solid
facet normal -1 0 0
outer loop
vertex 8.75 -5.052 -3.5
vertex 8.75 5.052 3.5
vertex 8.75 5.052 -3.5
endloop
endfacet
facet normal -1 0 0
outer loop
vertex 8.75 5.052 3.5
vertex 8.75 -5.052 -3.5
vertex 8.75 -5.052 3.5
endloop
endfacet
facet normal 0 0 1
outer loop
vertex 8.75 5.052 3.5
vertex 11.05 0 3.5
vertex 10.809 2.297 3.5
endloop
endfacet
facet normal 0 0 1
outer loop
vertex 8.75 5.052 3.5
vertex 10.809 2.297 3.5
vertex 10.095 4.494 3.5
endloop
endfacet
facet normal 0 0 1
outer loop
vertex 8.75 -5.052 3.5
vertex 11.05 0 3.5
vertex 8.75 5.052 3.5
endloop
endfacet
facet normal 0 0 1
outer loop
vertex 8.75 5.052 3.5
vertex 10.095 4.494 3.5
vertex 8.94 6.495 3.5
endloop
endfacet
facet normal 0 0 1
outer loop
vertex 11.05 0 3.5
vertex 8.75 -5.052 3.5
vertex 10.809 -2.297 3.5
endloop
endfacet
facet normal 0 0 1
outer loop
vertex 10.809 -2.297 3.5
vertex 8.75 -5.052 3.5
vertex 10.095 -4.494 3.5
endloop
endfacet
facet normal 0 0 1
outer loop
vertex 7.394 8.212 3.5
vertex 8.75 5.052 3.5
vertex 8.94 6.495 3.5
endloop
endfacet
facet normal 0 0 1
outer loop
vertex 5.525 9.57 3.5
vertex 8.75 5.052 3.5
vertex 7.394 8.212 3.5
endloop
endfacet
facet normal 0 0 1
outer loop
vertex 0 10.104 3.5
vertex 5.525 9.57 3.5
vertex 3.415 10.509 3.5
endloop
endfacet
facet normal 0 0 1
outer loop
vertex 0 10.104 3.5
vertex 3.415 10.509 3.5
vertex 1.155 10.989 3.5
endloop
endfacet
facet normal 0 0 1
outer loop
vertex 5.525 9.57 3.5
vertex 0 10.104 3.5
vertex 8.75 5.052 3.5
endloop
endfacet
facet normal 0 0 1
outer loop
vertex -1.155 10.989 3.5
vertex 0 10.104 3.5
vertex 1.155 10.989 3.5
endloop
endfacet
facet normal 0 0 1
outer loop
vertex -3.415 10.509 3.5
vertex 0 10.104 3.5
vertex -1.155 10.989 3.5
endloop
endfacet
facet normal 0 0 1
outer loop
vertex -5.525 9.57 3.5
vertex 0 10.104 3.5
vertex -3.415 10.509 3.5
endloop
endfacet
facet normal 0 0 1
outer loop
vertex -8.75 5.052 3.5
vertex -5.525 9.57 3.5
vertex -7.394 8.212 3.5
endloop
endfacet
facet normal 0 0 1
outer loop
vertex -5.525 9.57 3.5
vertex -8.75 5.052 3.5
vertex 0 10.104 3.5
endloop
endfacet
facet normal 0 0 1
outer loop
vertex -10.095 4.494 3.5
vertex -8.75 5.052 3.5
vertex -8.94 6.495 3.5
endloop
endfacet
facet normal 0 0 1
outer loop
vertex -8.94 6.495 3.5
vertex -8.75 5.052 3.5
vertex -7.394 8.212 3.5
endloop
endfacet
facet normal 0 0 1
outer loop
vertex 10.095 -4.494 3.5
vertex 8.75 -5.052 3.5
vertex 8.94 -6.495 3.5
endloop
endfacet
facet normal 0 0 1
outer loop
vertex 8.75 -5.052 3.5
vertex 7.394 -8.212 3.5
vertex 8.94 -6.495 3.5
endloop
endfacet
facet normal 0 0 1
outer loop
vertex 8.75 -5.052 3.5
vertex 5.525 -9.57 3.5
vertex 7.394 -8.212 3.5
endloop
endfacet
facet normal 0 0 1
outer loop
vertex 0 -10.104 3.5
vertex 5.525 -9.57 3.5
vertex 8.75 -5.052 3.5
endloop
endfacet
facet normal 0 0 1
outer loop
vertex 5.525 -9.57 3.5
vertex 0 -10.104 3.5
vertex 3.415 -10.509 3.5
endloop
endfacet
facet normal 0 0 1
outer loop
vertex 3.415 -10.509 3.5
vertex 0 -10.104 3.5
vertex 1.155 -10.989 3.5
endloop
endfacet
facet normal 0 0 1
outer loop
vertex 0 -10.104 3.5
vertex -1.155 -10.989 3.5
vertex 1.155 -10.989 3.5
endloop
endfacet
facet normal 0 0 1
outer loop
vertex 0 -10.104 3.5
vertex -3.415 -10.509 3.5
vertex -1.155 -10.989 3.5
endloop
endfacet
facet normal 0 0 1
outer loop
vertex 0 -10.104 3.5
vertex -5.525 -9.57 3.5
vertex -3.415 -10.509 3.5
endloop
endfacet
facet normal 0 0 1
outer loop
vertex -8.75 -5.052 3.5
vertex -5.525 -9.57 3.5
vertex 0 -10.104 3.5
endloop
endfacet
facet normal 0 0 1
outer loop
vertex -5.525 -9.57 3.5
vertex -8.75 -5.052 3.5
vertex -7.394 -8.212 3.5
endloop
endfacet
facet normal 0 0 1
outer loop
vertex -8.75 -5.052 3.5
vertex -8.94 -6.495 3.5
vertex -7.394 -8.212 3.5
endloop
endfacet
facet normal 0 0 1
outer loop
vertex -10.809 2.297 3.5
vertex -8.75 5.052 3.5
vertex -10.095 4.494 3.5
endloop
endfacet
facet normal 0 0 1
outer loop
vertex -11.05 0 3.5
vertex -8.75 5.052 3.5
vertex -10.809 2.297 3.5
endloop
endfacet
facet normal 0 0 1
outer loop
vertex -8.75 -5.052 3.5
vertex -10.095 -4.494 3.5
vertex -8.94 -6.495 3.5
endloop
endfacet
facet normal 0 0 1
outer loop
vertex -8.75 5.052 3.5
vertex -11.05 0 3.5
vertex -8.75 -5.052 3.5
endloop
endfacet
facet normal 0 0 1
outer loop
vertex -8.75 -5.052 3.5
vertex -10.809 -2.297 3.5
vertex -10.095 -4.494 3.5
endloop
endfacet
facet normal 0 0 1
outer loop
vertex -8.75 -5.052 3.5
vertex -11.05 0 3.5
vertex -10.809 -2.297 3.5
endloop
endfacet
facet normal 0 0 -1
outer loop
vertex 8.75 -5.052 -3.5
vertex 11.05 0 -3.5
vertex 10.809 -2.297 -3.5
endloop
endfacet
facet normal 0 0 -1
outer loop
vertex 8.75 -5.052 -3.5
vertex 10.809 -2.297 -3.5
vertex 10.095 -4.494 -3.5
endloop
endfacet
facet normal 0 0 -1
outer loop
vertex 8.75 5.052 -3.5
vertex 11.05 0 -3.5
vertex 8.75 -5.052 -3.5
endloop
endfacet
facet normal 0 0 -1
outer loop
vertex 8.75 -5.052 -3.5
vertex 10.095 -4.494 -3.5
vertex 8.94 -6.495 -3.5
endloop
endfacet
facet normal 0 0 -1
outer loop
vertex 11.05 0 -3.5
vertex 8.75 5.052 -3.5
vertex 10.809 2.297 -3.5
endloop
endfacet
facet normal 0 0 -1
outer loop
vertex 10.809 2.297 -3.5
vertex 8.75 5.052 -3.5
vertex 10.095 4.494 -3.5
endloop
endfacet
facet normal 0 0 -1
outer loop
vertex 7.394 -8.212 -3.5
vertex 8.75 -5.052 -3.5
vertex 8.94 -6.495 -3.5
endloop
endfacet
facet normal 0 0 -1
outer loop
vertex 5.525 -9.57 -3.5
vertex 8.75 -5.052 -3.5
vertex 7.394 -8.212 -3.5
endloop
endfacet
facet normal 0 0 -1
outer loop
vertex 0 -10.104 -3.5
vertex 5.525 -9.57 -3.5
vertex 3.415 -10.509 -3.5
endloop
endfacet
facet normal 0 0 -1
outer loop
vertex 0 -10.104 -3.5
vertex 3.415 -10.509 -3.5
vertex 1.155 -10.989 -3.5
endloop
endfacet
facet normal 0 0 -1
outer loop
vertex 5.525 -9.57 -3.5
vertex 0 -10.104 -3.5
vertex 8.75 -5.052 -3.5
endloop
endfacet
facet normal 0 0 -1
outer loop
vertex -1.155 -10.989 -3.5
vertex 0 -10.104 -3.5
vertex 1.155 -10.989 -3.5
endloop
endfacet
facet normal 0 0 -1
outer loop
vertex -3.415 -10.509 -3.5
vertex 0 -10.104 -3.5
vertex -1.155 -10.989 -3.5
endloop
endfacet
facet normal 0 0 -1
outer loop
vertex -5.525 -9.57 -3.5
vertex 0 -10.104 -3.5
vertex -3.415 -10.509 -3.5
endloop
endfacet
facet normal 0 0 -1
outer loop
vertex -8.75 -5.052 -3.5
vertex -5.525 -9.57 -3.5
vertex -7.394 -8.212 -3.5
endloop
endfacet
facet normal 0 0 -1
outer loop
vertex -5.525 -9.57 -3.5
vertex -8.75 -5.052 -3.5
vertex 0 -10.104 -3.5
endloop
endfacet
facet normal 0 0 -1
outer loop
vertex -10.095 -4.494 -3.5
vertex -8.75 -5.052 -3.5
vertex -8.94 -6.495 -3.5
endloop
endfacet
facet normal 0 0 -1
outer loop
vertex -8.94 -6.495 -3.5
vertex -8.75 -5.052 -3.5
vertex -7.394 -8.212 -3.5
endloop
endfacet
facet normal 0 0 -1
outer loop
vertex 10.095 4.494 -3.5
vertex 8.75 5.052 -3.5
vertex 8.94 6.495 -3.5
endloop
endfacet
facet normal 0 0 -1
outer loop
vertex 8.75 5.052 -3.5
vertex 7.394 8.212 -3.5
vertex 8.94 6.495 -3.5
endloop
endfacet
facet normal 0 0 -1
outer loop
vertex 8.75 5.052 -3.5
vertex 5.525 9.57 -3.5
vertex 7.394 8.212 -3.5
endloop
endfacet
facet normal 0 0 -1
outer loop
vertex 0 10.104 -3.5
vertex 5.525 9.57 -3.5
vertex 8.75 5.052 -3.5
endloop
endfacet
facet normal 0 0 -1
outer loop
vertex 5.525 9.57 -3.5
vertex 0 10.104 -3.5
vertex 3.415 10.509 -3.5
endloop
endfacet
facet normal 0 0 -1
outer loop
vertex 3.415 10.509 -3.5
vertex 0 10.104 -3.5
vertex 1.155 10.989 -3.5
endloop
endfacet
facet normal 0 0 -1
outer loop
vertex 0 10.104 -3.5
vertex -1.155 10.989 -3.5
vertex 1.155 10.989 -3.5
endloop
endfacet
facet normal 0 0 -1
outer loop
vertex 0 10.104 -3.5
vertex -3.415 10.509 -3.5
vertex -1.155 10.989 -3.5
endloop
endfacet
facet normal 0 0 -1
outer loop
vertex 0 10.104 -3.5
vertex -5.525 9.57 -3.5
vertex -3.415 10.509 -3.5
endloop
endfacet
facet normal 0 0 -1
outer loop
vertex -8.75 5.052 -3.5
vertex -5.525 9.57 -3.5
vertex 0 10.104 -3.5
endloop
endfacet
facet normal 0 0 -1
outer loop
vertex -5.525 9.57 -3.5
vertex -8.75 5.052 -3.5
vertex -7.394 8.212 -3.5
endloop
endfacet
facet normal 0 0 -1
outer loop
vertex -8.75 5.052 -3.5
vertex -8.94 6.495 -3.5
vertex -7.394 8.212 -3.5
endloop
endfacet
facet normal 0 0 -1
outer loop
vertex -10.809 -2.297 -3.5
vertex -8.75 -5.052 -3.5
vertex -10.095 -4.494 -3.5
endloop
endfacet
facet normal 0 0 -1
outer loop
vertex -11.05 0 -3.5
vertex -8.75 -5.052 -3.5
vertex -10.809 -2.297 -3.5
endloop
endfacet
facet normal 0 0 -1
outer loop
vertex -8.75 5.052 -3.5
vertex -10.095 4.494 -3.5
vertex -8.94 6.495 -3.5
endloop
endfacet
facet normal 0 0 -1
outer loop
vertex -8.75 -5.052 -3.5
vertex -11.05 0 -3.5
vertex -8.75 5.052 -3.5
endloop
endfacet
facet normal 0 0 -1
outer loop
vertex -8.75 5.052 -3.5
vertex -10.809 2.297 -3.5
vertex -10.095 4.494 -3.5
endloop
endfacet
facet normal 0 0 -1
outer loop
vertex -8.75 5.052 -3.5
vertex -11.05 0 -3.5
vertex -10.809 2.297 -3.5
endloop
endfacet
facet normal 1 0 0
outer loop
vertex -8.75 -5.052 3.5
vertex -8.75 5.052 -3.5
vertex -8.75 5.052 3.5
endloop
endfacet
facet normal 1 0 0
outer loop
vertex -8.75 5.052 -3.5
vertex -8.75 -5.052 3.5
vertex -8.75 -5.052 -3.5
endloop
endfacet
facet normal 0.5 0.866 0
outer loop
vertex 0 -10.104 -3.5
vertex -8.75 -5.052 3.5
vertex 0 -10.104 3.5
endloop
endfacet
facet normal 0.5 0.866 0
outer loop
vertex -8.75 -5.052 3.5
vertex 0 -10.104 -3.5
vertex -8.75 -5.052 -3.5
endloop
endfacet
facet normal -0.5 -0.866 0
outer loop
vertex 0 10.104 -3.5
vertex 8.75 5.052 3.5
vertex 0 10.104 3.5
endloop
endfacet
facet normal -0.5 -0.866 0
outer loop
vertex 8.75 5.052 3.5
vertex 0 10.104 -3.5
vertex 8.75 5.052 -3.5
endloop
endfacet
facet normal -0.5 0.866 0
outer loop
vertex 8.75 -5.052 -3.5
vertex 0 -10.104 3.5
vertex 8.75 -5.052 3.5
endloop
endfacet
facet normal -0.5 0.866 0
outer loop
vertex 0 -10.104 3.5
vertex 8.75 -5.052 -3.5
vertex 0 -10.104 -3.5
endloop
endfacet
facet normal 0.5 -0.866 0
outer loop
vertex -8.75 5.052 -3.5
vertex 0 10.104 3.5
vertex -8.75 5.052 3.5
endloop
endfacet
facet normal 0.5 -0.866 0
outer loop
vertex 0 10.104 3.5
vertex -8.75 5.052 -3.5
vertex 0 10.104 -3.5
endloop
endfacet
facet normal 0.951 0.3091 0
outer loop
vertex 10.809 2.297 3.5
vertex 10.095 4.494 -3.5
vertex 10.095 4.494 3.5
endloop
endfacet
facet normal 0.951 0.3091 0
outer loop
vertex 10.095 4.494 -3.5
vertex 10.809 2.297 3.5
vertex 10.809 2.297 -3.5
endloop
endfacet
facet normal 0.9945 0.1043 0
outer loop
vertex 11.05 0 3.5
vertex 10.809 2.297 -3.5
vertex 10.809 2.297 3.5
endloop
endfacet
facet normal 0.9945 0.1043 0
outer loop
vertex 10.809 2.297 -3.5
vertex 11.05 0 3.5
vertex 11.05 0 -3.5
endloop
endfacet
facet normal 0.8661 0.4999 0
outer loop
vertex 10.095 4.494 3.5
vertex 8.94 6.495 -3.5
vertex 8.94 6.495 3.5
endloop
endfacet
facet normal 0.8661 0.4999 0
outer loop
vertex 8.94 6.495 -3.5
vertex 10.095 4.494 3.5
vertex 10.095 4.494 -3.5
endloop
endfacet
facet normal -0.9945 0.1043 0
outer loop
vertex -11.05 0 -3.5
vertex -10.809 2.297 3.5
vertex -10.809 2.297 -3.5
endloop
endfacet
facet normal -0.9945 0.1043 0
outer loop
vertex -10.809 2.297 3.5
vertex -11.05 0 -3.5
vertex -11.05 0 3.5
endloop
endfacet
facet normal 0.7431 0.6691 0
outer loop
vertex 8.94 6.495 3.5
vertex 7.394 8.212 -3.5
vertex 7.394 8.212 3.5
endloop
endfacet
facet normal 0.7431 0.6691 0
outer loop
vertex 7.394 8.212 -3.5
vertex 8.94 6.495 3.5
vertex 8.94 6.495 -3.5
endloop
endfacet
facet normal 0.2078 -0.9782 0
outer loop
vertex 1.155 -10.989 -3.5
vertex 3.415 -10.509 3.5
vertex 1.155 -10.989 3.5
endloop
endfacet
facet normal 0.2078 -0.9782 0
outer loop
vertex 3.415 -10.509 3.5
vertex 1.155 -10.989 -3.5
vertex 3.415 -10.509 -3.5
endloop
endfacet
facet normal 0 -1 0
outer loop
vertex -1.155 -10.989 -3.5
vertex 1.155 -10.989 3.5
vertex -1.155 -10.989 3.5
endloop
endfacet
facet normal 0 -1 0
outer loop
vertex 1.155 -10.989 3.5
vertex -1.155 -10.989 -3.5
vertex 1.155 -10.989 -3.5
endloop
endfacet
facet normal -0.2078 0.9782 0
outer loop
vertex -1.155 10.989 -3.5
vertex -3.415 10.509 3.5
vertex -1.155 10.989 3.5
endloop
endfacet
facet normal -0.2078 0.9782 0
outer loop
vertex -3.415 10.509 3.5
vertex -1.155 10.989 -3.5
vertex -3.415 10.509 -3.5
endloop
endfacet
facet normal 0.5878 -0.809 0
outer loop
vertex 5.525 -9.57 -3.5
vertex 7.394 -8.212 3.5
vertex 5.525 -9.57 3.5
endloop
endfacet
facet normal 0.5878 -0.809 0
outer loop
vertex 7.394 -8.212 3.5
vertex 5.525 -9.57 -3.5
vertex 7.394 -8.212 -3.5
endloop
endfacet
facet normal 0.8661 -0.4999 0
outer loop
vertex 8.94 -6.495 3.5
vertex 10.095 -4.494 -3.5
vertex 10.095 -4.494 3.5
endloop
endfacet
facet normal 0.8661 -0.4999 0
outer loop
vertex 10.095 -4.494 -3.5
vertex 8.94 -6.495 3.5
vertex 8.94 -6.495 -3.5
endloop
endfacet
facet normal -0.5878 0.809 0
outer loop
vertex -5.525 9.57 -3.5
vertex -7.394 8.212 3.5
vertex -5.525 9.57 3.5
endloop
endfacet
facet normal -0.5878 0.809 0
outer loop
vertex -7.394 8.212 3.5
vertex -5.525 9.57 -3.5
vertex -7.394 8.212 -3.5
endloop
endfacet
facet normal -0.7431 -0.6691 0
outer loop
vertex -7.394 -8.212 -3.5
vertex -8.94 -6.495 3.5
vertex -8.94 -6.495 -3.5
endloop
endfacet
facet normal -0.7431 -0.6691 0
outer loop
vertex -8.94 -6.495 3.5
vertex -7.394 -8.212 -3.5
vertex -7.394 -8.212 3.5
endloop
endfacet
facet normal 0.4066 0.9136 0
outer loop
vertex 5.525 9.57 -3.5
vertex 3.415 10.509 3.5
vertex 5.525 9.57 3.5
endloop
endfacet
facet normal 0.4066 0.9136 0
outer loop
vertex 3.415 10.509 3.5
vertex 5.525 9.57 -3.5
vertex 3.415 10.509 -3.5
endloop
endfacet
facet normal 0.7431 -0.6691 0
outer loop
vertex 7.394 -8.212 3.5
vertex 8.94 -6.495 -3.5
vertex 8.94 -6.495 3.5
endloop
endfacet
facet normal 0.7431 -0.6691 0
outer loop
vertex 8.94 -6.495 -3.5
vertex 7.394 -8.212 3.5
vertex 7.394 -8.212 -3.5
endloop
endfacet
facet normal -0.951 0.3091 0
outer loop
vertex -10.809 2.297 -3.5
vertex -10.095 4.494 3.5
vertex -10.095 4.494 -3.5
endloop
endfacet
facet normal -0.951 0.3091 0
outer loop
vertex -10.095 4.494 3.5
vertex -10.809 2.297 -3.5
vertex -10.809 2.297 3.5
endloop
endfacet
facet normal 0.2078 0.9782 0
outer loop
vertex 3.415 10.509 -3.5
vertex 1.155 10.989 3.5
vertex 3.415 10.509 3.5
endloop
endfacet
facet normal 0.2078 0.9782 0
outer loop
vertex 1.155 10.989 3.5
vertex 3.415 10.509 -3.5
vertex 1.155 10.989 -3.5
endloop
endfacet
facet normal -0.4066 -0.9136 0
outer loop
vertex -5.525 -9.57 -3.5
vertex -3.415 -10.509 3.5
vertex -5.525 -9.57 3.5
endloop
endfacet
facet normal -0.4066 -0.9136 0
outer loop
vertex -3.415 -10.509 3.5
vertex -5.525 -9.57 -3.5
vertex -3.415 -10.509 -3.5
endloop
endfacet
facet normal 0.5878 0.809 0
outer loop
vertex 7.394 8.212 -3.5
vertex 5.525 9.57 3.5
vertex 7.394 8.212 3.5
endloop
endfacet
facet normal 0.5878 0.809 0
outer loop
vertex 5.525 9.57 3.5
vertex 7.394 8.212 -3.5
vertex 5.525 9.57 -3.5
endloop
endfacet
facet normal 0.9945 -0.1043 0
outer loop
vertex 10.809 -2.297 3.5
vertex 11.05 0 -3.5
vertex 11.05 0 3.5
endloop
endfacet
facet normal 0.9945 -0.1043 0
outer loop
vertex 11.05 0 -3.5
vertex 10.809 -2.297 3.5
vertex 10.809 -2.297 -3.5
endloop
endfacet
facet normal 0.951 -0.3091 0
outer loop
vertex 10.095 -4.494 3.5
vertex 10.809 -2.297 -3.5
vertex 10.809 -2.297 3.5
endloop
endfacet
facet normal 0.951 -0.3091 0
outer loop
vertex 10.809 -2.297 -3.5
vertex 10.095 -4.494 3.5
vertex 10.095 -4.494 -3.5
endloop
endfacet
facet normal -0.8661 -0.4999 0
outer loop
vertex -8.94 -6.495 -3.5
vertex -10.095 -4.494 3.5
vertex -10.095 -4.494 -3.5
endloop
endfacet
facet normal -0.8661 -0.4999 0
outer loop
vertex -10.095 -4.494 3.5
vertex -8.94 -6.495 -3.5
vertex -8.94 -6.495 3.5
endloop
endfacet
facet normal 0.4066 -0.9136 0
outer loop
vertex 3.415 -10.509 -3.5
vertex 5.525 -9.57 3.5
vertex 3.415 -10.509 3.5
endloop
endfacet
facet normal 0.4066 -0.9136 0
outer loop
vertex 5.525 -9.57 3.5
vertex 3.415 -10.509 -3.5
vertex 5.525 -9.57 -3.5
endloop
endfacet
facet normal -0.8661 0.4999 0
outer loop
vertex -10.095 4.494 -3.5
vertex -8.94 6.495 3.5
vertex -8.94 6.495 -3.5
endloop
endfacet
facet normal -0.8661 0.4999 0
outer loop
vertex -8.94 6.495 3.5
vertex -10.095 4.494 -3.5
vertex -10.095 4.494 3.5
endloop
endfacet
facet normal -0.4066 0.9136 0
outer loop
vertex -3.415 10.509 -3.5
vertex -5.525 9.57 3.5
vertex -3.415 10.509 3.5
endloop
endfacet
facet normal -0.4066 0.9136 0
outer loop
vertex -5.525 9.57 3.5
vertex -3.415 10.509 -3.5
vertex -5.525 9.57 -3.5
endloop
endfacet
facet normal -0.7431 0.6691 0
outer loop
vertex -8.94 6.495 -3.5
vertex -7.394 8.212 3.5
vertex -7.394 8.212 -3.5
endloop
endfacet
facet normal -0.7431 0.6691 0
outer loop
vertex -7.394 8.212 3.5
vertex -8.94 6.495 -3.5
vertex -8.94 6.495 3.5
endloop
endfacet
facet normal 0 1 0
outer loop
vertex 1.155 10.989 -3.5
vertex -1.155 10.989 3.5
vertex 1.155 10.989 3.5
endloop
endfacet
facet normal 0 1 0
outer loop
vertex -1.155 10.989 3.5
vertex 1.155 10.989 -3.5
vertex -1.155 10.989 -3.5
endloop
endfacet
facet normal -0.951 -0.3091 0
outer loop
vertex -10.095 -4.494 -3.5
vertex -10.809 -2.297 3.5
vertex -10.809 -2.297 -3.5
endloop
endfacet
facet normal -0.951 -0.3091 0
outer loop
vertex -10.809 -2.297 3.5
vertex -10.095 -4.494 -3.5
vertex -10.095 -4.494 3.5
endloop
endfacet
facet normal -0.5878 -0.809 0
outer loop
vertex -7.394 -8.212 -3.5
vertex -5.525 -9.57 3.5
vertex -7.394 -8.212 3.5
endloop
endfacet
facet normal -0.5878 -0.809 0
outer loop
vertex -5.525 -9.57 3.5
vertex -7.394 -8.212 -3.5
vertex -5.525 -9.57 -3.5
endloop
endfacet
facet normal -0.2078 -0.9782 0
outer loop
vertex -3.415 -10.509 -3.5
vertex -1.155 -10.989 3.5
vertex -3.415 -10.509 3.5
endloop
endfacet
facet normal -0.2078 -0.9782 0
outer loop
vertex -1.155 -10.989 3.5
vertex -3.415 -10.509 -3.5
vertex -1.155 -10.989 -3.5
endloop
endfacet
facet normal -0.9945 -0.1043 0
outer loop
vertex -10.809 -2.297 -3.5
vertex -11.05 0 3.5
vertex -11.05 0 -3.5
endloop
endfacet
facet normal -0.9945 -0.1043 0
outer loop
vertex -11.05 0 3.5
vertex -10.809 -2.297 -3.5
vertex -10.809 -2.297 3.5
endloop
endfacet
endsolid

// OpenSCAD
// Diameter of bearing hole you are filling (mm) - make it snug!
bearing_d = 22.1; 
// Height of bearing hole you are filling (mm)
bearing_h = 7;
// Diameter of hex nut side to side (not corners) - a 7/16-inch nut is about 17.5mm
hexnut_d = 17.5;   

module hexagon(width,height) {
    angle = 360/6;
    cot = width / tan(angle);
    echo(angle, 1/tan(angle), cot);
    union()
    {
        rotate([0,0,0])
            cube([width,cot,height],center=true);
        rotate([0,0,angle])
            cube([width,cot,height],center=true);
        rotate([0,0,2*angle])
            cube([width,cot,height],center=true);
    }
}

difference() {
    cylinder(r=bearing_d/2,h=bearing_h,center=true);
    hexagon(hexnut_d,bearing_h);
}
